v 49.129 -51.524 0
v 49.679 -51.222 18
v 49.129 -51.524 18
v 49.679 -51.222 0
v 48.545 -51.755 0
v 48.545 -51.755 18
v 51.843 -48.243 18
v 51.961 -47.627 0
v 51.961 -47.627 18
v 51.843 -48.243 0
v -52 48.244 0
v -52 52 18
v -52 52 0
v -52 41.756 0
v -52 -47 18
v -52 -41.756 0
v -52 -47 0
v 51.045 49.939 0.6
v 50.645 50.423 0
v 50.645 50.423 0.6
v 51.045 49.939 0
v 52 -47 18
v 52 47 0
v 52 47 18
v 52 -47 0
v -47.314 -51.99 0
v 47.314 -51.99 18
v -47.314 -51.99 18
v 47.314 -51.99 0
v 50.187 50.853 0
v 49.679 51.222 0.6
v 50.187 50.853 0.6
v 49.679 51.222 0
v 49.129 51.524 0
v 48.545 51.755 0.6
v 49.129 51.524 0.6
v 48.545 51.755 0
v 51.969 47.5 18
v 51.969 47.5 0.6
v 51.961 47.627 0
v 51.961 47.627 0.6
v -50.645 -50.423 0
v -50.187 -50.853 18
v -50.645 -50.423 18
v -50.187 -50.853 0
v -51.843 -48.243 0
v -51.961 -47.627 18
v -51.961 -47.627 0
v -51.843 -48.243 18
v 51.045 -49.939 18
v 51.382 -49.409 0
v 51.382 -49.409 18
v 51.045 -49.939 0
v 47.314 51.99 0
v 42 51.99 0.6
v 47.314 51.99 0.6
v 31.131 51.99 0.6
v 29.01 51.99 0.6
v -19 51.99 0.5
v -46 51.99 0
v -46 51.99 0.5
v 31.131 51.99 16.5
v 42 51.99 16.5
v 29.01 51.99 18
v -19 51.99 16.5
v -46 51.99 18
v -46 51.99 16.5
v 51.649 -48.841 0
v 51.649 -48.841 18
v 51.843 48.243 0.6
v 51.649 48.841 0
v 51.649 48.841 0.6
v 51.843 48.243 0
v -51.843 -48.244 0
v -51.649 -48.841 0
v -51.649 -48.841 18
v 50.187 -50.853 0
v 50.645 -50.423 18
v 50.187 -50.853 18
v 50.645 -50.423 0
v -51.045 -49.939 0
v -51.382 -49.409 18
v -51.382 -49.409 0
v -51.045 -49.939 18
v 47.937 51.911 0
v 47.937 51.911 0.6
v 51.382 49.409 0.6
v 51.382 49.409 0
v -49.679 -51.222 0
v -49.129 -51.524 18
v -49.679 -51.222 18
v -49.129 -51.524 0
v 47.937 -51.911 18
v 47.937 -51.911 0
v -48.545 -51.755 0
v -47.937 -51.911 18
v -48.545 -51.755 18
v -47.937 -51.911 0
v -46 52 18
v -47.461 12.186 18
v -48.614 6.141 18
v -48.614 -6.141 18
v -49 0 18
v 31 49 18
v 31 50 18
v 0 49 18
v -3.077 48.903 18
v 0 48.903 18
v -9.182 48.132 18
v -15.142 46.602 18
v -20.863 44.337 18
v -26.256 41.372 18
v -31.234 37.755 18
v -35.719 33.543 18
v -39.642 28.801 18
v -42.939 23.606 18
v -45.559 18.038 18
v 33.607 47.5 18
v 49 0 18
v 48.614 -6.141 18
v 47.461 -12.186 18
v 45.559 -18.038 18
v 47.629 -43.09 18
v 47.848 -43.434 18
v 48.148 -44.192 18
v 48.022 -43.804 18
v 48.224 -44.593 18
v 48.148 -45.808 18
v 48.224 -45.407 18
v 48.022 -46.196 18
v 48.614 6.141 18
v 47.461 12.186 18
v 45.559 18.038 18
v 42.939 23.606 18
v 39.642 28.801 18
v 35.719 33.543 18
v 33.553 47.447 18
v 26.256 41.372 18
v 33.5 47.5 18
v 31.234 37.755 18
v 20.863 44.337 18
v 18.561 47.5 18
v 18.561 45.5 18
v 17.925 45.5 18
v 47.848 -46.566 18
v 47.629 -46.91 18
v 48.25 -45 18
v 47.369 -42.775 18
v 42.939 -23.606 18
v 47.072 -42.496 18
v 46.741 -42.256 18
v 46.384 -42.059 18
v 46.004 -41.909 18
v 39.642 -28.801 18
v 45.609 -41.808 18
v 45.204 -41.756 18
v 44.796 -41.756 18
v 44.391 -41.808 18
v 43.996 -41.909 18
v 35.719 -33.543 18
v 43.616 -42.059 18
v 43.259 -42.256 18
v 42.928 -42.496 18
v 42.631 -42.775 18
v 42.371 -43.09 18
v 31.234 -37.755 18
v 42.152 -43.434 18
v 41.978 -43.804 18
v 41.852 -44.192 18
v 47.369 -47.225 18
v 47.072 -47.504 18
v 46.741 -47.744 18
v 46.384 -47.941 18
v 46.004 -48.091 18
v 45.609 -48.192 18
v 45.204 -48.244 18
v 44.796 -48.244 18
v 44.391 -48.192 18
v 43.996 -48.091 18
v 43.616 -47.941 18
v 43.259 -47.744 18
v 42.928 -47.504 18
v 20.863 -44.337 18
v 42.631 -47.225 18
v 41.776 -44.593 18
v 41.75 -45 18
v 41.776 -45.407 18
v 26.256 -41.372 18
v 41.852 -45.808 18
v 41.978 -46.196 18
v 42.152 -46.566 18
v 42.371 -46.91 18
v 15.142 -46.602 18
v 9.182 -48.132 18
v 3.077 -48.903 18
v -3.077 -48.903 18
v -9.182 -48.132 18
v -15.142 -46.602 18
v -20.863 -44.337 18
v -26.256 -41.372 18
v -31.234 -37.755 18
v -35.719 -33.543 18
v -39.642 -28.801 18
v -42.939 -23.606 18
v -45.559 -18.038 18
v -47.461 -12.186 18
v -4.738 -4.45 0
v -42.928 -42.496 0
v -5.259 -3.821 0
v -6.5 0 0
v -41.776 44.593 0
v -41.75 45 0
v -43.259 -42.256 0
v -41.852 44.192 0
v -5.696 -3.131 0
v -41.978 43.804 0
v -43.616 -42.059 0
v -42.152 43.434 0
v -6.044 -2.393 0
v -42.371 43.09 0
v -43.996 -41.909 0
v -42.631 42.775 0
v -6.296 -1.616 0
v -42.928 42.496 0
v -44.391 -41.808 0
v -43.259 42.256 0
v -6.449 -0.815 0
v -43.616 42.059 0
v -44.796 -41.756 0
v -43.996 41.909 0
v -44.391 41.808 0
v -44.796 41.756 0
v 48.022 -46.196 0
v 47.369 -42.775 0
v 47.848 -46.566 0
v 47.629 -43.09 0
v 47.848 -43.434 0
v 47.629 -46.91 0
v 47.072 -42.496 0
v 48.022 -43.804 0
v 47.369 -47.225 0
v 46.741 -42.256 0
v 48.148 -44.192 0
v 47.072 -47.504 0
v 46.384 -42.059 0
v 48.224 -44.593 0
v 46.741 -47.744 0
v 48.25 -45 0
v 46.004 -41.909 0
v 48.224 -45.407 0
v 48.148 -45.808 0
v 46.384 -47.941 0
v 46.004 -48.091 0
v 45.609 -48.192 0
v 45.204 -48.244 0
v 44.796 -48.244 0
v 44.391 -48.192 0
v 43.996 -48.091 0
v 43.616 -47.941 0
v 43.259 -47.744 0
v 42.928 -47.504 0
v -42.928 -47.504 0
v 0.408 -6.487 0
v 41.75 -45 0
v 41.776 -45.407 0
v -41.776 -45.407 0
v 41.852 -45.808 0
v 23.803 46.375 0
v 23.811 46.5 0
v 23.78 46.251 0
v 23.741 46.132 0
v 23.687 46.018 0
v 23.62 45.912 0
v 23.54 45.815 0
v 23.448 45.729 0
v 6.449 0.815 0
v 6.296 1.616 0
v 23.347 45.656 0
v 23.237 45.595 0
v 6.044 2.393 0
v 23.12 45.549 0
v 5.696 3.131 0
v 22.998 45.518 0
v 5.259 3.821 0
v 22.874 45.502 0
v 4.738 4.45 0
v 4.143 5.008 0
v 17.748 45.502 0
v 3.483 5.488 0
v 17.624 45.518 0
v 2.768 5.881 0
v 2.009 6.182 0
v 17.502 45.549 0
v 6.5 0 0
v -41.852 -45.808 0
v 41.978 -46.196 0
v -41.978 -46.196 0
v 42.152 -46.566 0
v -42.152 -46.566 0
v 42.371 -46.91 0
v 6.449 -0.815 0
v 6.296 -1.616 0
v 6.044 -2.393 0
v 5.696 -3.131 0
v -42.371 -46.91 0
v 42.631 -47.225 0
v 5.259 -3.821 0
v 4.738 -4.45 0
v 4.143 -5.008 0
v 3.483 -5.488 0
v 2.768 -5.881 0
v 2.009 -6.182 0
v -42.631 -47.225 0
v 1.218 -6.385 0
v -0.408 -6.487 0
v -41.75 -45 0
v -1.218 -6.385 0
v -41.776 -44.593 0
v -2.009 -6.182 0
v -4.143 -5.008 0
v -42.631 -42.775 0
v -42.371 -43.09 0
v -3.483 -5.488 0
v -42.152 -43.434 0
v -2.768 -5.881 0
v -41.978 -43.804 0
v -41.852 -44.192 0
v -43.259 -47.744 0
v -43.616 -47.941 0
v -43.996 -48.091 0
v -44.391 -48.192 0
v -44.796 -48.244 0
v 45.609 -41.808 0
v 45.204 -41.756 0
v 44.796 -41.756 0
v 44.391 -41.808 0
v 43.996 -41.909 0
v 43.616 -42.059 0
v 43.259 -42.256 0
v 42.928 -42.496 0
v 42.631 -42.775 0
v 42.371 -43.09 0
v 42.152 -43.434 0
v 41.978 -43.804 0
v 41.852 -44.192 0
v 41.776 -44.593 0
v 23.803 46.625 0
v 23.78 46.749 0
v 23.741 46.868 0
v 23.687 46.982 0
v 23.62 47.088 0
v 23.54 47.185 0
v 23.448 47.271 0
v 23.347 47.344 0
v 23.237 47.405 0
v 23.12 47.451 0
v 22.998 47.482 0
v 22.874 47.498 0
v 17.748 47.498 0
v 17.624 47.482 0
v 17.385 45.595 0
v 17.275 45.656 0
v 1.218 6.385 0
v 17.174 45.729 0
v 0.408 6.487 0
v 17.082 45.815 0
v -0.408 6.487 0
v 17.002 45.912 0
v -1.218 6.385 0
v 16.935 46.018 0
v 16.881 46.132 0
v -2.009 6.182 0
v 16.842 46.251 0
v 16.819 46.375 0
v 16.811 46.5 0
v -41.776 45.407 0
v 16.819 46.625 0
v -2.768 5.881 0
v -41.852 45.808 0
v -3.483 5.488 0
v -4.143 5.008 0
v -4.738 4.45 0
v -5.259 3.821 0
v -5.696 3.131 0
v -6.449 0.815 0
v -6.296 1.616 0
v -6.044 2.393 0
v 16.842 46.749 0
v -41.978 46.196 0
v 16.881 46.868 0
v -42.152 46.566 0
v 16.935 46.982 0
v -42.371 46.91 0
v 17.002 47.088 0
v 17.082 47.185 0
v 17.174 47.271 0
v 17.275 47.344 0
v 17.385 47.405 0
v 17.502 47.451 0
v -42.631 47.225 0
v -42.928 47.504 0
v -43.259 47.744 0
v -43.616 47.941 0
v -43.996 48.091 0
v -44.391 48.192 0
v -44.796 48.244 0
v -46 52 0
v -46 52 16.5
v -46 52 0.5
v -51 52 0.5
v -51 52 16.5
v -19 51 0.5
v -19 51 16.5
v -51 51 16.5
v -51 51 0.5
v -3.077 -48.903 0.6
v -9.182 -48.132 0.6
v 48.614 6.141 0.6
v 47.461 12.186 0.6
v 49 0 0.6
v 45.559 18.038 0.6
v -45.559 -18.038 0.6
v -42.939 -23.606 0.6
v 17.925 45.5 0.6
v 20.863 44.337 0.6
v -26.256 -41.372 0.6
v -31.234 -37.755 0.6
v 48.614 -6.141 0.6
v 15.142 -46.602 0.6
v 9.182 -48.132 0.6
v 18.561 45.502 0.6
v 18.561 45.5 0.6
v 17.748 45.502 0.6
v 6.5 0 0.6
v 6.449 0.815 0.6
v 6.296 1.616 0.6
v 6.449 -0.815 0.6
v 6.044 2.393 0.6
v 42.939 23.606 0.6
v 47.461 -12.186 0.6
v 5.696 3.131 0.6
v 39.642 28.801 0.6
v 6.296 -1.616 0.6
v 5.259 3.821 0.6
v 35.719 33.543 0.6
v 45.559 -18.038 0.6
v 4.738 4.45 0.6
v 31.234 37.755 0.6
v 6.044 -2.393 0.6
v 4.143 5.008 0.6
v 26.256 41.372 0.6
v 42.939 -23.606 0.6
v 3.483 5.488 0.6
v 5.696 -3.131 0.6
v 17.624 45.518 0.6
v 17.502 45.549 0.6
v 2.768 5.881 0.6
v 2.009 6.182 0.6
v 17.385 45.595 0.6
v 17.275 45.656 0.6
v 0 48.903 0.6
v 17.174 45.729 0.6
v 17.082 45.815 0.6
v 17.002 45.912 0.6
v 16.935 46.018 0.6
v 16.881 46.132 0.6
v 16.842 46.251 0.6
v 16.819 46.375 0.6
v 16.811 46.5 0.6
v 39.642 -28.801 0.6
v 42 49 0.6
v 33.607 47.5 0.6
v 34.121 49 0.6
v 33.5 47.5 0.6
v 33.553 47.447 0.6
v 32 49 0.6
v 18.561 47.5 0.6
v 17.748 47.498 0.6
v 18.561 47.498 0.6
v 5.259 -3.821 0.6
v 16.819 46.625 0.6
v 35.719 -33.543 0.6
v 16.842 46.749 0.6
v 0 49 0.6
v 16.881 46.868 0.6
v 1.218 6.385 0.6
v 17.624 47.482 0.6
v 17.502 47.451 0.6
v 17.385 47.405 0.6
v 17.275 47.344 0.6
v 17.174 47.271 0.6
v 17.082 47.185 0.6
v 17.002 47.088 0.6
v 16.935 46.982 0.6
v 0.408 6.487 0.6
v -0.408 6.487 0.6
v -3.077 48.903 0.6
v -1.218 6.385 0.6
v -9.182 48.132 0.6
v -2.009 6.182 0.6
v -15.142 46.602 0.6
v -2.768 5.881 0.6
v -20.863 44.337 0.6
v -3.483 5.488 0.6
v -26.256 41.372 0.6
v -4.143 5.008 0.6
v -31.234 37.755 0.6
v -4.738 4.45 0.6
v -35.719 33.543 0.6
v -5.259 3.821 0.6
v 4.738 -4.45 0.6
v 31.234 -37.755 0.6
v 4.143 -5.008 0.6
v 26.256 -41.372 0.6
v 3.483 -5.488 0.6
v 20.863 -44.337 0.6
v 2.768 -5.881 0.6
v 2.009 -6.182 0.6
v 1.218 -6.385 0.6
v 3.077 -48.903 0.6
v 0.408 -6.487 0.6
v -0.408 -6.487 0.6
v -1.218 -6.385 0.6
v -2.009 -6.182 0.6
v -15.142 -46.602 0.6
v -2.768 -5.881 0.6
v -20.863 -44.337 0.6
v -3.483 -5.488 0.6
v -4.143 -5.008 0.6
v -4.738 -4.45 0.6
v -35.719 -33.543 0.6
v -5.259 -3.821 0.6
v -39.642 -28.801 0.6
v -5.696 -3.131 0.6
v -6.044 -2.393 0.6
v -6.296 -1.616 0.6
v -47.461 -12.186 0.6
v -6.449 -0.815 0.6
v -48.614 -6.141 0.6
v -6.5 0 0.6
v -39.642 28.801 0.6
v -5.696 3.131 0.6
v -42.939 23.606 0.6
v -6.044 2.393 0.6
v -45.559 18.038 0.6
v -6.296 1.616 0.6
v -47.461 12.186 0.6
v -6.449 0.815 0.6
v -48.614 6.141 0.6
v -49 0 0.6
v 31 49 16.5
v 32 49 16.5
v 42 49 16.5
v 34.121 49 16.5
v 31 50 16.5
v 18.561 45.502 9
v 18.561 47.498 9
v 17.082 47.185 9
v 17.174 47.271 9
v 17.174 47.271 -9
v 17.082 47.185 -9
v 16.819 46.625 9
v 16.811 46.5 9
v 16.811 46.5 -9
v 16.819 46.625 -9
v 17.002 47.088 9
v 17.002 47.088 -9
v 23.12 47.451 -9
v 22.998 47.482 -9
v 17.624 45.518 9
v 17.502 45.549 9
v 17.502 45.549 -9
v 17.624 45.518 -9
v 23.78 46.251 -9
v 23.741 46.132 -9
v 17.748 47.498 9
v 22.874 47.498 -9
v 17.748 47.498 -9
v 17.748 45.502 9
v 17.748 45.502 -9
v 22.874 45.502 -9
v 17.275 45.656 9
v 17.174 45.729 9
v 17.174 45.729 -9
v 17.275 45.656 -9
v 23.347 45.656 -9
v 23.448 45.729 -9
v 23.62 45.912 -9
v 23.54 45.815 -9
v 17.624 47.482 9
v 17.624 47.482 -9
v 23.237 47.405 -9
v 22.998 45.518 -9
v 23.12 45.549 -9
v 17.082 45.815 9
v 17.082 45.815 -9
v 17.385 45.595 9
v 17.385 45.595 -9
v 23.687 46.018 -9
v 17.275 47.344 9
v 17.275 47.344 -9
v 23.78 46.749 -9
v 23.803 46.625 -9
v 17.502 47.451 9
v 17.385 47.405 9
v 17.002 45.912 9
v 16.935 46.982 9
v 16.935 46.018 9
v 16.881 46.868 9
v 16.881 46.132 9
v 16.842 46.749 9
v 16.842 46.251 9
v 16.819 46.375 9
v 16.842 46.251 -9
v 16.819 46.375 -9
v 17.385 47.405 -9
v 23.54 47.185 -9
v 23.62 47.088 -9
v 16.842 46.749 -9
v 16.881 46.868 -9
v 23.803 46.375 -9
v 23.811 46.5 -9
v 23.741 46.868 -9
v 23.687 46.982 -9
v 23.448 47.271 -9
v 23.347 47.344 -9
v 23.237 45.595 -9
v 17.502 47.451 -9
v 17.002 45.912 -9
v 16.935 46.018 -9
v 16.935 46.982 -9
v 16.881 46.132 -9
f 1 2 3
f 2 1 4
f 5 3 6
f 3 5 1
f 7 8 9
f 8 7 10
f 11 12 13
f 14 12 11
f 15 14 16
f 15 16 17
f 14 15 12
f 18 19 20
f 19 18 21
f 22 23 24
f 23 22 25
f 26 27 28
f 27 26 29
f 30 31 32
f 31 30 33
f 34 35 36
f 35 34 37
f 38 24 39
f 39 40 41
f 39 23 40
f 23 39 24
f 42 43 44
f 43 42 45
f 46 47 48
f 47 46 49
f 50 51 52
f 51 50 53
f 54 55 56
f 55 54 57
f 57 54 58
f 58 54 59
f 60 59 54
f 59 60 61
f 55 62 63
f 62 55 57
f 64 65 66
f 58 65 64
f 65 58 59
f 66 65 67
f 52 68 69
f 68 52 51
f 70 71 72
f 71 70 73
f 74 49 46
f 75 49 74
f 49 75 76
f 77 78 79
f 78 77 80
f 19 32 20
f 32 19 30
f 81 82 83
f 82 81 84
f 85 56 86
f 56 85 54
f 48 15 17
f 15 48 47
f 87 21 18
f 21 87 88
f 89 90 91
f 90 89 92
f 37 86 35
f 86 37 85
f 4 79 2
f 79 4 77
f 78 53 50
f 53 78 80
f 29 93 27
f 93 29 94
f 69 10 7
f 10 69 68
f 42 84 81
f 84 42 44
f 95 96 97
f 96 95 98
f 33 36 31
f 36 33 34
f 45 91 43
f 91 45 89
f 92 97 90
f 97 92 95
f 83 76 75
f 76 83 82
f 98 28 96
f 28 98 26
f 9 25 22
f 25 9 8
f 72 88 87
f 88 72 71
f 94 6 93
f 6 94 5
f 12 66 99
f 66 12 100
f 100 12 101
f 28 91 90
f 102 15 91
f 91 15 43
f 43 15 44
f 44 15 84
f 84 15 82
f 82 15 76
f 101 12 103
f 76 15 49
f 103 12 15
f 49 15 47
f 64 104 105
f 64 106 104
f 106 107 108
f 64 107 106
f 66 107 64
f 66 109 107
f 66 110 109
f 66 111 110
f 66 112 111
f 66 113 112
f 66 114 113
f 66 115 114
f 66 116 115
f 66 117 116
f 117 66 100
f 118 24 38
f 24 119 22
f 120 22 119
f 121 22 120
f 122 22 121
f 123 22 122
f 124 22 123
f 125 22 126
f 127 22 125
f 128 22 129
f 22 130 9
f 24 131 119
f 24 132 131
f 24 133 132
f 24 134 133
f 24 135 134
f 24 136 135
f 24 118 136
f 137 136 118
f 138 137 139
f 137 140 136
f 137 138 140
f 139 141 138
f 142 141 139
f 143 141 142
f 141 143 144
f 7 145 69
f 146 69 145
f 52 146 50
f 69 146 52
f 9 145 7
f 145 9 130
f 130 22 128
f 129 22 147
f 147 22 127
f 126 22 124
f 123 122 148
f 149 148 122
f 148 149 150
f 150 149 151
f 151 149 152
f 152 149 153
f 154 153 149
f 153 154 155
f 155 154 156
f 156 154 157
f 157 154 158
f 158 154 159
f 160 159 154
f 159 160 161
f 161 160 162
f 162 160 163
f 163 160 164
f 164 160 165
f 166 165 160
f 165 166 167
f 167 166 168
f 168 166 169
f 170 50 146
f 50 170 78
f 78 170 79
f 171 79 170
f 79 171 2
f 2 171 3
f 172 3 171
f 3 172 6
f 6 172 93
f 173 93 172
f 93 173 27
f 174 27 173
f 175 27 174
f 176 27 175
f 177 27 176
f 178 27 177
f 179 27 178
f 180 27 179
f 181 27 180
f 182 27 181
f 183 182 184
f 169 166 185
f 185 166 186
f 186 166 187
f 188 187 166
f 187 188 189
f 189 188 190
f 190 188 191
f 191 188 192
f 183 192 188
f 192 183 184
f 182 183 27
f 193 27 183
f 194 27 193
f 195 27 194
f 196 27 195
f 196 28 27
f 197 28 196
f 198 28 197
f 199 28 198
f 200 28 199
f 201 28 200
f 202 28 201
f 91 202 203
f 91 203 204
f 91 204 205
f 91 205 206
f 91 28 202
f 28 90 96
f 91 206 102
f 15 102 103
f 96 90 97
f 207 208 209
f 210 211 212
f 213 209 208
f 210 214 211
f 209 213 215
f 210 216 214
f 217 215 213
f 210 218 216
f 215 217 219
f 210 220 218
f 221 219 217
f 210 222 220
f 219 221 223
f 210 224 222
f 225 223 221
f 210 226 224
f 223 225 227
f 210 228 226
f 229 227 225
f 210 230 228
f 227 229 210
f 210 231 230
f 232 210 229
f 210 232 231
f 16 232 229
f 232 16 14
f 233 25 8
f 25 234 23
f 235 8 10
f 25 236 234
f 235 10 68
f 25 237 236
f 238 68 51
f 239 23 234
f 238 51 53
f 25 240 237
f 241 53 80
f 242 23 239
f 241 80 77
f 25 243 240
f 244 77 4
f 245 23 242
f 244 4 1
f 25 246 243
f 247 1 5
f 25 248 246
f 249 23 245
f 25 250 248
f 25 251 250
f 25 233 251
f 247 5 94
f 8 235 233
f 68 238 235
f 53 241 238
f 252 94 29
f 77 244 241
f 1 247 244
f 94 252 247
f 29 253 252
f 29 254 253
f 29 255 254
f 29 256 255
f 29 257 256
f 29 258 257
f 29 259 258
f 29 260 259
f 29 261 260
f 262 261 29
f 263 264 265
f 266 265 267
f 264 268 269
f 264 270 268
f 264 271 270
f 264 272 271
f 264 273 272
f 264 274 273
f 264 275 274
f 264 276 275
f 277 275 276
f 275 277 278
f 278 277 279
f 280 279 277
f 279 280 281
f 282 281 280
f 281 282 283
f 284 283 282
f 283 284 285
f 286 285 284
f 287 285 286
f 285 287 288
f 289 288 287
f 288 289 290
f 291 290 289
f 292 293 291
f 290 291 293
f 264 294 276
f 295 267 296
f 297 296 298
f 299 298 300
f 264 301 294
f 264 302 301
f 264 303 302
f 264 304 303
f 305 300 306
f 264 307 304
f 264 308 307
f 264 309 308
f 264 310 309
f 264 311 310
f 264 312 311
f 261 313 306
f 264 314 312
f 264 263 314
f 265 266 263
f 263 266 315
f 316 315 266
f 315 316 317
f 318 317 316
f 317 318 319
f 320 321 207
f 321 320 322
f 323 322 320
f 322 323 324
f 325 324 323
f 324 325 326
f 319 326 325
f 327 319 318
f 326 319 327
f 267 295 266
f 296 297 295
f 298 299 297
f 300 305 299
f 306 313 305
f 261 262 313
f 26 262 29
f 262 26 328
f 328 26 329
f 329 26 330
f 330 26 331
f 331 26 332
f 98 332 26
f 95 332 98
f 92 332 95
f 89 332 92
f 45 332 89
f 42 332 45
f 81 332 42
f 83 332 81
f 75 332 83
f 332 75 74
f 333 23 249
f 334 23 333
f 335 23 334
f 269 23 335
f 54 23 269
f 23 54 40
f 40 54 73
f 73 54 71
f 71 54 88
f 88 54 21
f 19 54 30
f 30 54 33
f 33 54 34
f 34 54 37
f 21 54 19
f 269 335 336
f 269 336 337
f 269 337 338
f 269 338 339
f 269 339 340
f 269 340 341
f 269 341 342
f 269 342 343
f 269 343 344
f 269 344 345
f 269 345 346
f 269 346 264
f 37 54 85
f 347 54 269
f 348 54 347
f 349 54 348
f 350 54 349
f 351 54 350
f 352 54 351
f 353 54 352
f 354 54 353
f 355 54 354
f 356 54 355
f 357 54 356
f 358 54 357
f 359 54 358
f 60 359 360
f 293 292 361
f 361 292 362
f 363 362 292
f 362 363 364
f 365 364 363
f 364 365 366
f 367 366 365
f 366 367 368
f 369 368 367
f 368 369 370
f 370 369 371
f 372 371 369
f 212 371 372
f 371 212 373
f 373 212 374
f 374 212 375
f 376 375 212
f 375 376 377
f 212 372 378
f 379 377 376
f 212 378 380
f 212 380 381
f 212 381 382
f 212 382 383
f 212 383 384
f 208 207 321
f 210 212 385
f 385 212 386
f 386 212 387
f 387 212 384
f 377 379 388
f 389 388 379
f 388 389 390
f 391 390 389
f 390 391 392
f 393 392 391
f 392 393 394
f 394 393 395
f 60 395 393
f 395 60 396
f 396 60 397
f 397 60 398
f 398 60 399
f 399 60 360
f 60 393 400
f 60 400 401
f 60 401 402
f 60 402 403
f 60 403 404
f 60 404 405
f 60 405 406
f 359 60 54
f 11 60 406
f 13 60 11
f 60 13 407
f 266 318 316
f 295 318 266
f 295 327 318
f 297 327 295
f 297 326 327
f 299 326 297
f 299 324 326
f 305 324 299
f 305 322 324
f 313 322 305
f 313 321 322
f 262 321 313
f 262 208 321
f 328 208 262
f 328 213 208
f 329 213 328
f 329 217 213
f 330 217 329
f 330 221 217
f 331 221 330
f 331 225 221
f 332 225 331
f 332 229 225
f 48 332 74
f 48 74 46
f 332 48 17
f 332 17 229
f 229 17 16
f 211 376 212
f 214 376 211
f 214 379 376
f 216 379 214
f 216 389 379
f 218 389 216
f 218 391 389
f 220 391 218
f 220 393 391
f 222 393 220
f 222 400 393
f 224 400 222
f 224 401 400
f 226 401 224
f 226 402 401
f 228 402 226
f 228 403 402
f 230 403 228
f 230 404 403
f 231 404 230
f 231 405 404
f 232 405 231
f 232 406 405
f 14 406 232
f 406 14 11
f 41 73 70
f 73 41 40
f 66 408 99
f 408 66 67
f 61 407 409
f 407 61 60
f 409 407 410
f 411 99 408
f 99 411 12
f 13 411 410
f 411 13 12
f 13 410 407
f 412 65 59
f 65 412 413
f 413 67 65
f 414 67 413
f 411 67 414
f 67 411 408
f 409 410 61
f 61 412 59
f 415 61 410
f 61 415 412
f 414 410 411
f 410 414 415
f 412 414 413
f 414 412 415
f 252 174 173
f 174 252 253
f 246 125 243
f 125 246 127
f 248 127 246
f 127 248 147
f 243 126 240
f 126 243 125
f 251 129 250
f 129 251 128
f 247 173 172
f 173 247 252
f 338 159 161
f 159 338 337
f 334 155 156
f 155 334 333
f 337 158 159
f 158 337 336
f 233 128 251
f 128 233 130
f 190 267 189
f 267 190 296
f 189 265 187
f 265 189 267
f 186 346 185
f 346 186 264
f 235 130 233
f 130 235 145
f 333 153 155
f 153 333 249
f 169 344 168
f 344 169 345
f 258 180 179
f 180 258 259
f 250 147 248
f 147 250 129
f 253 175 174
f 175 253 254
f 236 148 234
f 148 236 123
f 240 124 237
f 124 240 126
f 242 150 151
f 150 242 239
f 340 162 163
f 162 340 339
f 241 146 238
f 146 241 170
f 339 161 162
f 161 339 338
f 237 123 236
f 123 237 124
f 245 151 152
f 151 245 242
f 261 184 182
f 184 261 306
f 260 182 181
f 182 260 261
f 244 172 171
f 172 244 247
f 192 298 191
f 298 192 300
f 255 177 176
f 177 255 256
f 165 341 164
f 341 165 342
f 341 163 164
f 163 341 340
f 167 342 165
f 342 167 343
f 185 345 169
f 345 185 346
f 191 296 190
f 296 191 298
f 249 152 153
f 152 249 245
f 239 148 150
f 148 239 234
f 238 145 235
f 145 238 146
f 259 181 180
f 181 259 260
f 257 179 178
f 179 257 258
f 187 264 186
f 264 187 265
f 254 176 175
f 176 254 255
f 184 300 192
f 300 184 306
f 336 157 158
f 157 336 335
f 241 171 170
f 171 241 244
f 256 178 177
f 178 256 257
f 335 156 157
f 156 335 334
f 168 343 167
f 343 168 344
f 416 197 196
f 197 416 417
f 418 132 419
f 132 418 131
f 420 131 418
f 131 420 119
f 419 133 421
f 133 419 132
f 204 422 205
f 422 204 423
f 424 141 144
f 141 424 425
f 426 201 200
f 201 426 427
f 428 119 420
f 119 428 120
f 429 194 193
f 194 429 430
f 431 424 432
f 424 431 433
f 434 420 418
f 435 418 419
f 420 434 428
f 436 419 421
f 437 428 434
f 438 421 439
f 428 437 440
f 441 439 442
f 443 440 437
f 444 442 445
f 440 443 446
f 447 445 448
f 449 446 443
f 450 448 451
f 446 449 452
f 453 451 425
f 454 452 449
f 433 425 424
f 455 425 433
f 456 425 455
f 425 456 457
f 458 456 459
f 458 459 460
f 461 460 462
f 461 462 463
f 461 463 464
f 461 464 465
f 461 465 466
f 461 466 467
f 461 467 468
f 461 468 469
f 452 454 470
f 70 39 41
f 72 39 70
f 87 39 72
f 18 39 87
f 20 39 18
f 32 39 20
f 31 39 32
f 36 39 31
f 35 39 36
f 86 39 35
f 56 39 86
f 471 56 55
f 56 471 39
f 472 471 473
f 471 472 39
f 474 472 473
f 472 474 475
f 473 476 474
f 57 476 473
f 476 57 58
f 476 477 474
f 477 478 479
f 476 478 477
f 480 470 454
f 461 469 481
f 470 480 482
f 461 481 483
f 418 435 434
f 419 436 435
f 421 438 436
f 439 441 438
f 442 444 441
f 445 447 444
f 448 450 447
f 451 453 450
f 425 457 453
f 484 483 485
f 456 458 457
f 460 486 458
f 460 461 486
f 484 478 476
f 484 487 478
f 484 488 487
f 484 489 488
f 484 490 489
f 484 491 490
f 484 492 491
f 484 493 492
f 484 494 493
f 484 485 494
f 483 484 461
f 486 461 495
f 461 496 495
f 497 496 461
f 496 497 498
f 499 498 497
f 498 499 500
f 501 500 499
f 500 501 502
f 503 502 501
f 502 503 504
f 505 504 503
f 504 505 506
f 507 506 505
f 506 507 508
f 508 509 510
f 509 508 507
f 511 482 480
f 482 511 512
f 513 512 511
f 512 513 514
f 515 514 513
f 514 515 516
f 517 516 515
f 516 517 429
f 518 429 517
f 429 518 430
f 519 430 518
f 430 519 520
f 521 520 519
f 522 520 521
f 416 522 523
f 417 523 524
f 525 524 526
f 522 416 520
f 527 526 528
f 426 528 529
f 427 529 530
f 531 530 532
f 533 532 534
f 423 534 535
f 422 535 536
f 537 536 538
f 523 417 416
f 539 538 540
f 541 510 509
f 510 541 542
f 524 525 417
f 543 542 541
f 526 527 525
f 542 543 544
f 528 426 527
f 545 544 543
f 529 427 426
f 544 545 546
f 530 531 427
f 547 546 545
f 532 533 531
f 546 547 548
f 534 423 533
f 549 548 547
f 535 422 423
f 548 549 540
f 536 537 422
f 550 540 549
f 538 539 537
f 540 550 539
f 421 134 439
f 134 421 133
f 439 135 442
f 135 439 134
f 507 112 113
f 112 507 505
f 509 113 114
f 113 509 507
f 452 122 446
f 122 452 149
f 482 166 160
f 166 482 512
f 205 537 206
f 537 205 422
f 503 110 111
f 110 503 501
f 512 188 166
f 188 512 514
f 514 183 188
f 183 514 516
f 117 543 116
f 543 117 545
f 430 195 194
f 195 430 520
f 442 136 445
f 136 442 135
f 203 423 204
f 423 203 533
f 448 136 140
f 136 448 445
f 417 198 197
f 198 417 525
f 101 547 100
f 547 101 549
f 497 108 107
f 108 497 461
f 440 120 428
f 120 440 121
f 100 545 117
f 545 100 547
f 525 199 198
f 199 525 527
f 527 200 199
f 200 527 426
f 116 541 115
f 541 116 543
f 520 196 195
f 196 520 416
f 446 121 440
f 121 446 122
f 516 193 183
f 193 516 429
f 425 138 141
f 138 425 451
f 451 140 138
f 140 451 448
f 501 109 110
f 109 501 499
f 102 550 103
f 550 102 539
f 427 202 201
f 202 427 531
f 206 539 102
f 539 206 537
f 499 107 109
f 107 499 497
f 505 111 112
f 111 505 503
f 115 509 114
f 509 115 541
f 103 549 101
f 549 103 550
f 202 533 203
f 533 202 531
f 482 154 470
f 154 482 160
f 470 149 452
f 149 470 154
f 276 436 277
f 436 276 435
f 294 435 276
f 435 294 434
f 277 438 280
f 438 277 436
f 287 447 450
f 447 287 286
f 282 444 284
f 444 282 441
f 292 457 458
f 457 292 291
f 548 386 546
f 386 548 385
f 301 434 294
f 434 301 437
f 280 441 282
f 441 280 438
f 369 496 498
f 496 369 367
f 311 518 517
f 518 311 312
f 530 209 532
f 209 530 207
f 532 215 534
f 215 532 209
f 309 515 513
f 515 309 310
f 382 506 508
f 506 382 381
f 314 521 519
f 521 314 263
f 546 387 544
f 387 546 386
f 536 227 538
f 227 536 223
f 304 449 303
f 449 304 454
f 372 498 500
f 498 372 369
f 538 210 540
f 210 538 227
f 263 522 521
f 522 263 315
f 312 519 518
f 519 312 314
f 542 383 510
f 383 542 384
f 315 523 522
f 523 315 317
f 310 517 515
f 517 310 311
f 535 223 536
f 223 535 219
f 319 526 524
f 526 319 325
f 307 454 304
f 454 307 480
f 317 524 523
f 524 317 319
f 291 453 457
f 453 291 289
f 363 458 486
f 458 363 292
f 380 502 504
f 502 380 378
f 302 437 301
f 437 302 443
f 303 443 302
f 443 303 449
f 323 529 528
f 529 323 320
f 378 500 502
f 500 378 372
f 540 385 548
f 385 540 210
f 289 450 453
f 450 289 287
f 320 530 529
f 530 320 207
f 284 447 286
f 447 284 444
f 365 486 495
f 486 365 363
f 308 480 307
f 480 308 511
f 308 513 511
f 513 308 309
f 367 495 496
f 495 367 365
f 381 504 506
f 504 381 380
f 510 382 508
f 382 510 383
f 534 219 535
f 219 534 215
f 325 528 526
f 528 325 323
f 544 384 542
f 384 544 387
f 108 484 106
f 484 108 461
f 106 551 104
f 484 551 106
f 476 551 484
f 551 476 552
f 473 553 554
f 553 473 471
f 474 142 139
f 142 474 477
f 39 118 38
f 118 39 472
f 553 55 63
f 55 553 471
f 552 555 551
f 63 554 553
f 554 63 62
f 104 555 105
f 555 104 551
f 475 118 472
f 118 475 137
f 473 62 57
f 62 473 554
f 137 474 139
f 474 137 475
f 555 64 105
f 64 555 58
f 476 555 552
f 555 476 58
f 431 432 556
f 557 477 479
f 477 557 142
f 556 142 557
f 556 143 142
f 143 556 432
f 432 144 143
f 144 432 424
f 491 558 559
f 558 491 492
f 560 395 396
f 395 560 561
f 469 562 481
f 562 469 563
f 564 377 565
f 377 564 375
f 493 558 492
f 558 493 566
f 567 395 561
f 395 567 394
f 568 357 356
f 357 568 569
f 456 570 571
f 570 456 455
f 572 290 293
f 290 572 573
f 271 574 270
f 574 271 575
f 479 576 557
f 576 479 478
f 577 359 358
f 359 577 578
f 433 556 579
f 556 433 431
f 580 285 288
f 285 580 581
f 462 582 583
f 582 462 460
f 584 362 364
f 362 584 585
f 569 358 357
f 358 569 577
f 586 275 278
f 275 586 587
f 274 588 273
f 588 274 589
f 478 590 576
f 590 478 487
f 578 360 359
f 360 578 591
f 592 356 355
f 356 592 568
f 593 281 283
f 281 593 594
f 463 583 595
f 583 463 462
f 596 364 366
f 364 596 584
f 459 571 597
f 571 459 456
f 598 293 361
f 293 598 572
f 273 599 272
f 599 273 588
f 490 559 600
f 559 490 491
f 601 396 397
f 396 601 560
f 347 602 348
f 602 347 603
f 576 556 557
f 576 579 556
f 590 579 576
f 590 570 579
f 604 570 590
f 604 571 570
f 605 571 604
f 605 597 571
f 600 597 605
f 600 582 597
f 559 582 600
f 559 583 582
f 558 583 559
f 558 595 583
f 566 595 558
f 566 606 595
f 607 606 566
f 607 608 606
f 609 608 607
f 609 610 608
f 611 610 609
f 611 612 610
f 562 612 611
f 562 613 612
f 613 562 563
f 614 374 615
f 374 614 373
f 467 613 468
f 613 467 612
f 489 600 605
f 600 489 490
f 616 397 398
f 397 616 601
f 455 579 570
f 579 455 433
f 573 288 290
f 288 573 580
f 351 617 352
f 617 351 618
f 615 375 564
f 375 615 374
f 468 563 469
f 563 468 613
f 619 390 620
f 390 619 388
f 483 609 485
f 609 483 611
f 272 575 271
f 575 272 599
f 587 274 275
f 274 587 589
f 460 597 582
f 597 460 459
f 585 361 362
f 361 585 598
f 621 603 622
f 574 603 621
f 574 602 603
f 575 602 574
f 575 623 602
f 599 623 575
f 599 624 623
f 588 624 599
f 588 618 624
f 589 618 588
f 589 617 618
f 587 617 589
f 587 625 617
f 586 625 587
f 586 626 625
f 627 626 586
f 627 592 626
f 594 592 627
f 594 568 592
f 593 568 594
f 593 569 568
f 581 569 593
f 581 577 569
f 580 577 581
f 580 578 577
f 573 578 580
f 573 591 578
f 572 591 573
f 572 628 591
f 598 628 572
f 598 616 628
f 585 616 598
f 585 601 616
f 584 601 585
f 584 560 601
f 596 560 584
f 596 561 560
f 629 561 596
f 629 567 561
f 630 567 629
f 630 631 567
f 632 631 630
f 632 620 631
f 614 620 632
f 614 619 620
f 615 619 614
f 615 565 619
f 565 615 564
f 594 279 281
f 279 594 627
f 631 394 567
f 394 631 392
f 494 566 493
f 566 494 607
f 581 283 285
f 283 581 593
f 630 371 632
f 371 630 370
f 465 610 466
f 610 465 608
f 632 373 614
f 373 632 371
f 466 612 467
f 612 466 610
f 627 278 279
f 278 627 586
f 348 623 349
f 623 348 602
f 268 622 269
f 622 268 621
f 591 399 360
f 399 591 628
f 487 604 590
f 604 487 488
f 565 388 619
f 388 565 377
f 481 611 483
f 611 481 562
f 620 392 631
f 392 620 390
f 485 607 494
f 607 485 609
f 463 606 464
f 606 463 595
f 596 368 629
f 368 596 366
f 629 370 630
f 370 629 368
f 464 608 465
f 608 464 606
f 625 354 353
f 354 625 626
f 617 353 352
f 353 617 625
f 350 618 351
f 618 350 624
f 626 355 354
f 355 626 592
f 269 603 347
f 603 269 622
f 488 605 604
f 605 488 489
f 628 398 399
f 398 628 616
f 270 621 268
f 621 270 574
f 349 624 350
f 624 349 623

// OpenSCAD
$fn = 50;


union() {
	difference() {
		union() {
			hull() {
				translate(v = [-47.0000000000, 47.0000000000, 0]) {
					cylinder(h = 18, r = 5);
				}
				translate(v = [47.0000000000, 47.0000000000, 0]) {
					cylinder(h = 18, r = 5);
				}
				translate(v = [-47.0000000000, -47.0000000000, 0]) {
					cylinder(h = 18, r = 5);
				}
				translate(v = [47.0000000000, -47.0000000000, 0]) {
					cylinder(h = 18, r = 5);
				}
			}
			translate(v = [-52.0000000000, 46.0000000000, 0]) {
				cube(size = [6, 6, 18]);
			}
		}
		union() {
			translate(v = [-52.5000000000, -45.0000000000, -250.0000000000]) {
				rotate(a = [0, 0, 0]) {
					difference() {
						union() {
							hull() {
								translate(v = [7.5000000000, 0, 0]) {
									cylinder(h = 250, r = 3.2500000000, r1 = 3.2500000000, r2 = 3.2500000000);
								}
								translate(v = [-7.5000000000, 0, 0]) {
									cylinder(h = 250, r = 3.2500000000, r1 = 3.2500000000, r2 = 3.2500000000);
								}
							}
						}
						union();
					}
				}
			}
			translate(v = [-52.5000000000, 45.0000000000, -250.0000000000]) {
				rotate(a = [0, 0, 0]) {
					difference() {
						union() {
							hull() {
								translate(v = [7.5000000000, 0, 0]) {
									cylinder(h = 250, r = 3.2500000000, r1 = 3.2500000000, r2 = 3.2500000000);
								}
								translate(v = [-7.5000000000, 0, 0]) {
									cylinder(h = 250, r = 3.2500000000, r1 = 3.2500000000, r2 = 3.2500000000);
								}
							}
						}
						union();
					}
				}
			}
			translate(v = [-51.0000000000, 51.0000000000, 0.5000000000]) {
				cube(size = [32, 1, 16]);
			}
			translate(v = [45.0000000000, -45.0000000000, 0]) {
				cylinder(h = 100, r = 3.2500000000);
			}
			translate(v = [0, 0, 0.6000000000]) {
				cylinder(h = 20.4000000000, r = 49.0000000000);
			}
			translate(v = [0, 0, -9.0000000000]) {
				cylinder(h = 18, r = 6.5000000000);
			}
			translate(v = [0.0000000000, 47.5000000000, 0.6000000000]) {
				cube(size = [52.0000000000, 1.5000000000, 20.4000000000]);
			}
			translate(v = [42.0000000000, 47.5000000000, 0.6000000000]) {
				cube(size = [10, 4.5000000000, 20.4000000000]);
			}
			translate(v = [31.0000000000, 47.5000000000, 16.5000000000]) {
				cube(size = [21, 4.5000000000, 1.5000000000]);
			}
			translate(v = [28.2500000000, 52.7500000000, 0.6000000000]) {
				rotate(a = [0, 0, -45]) {
					cube(size = [7.5000000000, 1.5000000000, 20.4000000000]);
				}
			}
			translate(v = [11.0610000000, 45.5000000000, 0.6000000000]) {
				cube(size = [7.5000000000, 2, 17.4000000000]);
			}
		}
	}
	union() {
		translate(v = [20.3110000000, 46.5000000000, -9.0000000000]) {
			rotate(a = [0, 0, 0]) {
				difference() {
					union() {
						#hull() {
							#translate(v = [2.5000000000, 0, 0]) {
								cylinder(h = 18, r = 1.0000000000, r1 = 1.0000000000, r2 = 1.0000000000);
							}
							#translate(v = [-2.5000000000, 0, 0]) {
								cylinder(h = 18, r = 1.0000000000, r1 = 1.0000000000, r2 = 1.0000000000);
							}
						}
					}
					union();
				}
			}
		}
	}
}
